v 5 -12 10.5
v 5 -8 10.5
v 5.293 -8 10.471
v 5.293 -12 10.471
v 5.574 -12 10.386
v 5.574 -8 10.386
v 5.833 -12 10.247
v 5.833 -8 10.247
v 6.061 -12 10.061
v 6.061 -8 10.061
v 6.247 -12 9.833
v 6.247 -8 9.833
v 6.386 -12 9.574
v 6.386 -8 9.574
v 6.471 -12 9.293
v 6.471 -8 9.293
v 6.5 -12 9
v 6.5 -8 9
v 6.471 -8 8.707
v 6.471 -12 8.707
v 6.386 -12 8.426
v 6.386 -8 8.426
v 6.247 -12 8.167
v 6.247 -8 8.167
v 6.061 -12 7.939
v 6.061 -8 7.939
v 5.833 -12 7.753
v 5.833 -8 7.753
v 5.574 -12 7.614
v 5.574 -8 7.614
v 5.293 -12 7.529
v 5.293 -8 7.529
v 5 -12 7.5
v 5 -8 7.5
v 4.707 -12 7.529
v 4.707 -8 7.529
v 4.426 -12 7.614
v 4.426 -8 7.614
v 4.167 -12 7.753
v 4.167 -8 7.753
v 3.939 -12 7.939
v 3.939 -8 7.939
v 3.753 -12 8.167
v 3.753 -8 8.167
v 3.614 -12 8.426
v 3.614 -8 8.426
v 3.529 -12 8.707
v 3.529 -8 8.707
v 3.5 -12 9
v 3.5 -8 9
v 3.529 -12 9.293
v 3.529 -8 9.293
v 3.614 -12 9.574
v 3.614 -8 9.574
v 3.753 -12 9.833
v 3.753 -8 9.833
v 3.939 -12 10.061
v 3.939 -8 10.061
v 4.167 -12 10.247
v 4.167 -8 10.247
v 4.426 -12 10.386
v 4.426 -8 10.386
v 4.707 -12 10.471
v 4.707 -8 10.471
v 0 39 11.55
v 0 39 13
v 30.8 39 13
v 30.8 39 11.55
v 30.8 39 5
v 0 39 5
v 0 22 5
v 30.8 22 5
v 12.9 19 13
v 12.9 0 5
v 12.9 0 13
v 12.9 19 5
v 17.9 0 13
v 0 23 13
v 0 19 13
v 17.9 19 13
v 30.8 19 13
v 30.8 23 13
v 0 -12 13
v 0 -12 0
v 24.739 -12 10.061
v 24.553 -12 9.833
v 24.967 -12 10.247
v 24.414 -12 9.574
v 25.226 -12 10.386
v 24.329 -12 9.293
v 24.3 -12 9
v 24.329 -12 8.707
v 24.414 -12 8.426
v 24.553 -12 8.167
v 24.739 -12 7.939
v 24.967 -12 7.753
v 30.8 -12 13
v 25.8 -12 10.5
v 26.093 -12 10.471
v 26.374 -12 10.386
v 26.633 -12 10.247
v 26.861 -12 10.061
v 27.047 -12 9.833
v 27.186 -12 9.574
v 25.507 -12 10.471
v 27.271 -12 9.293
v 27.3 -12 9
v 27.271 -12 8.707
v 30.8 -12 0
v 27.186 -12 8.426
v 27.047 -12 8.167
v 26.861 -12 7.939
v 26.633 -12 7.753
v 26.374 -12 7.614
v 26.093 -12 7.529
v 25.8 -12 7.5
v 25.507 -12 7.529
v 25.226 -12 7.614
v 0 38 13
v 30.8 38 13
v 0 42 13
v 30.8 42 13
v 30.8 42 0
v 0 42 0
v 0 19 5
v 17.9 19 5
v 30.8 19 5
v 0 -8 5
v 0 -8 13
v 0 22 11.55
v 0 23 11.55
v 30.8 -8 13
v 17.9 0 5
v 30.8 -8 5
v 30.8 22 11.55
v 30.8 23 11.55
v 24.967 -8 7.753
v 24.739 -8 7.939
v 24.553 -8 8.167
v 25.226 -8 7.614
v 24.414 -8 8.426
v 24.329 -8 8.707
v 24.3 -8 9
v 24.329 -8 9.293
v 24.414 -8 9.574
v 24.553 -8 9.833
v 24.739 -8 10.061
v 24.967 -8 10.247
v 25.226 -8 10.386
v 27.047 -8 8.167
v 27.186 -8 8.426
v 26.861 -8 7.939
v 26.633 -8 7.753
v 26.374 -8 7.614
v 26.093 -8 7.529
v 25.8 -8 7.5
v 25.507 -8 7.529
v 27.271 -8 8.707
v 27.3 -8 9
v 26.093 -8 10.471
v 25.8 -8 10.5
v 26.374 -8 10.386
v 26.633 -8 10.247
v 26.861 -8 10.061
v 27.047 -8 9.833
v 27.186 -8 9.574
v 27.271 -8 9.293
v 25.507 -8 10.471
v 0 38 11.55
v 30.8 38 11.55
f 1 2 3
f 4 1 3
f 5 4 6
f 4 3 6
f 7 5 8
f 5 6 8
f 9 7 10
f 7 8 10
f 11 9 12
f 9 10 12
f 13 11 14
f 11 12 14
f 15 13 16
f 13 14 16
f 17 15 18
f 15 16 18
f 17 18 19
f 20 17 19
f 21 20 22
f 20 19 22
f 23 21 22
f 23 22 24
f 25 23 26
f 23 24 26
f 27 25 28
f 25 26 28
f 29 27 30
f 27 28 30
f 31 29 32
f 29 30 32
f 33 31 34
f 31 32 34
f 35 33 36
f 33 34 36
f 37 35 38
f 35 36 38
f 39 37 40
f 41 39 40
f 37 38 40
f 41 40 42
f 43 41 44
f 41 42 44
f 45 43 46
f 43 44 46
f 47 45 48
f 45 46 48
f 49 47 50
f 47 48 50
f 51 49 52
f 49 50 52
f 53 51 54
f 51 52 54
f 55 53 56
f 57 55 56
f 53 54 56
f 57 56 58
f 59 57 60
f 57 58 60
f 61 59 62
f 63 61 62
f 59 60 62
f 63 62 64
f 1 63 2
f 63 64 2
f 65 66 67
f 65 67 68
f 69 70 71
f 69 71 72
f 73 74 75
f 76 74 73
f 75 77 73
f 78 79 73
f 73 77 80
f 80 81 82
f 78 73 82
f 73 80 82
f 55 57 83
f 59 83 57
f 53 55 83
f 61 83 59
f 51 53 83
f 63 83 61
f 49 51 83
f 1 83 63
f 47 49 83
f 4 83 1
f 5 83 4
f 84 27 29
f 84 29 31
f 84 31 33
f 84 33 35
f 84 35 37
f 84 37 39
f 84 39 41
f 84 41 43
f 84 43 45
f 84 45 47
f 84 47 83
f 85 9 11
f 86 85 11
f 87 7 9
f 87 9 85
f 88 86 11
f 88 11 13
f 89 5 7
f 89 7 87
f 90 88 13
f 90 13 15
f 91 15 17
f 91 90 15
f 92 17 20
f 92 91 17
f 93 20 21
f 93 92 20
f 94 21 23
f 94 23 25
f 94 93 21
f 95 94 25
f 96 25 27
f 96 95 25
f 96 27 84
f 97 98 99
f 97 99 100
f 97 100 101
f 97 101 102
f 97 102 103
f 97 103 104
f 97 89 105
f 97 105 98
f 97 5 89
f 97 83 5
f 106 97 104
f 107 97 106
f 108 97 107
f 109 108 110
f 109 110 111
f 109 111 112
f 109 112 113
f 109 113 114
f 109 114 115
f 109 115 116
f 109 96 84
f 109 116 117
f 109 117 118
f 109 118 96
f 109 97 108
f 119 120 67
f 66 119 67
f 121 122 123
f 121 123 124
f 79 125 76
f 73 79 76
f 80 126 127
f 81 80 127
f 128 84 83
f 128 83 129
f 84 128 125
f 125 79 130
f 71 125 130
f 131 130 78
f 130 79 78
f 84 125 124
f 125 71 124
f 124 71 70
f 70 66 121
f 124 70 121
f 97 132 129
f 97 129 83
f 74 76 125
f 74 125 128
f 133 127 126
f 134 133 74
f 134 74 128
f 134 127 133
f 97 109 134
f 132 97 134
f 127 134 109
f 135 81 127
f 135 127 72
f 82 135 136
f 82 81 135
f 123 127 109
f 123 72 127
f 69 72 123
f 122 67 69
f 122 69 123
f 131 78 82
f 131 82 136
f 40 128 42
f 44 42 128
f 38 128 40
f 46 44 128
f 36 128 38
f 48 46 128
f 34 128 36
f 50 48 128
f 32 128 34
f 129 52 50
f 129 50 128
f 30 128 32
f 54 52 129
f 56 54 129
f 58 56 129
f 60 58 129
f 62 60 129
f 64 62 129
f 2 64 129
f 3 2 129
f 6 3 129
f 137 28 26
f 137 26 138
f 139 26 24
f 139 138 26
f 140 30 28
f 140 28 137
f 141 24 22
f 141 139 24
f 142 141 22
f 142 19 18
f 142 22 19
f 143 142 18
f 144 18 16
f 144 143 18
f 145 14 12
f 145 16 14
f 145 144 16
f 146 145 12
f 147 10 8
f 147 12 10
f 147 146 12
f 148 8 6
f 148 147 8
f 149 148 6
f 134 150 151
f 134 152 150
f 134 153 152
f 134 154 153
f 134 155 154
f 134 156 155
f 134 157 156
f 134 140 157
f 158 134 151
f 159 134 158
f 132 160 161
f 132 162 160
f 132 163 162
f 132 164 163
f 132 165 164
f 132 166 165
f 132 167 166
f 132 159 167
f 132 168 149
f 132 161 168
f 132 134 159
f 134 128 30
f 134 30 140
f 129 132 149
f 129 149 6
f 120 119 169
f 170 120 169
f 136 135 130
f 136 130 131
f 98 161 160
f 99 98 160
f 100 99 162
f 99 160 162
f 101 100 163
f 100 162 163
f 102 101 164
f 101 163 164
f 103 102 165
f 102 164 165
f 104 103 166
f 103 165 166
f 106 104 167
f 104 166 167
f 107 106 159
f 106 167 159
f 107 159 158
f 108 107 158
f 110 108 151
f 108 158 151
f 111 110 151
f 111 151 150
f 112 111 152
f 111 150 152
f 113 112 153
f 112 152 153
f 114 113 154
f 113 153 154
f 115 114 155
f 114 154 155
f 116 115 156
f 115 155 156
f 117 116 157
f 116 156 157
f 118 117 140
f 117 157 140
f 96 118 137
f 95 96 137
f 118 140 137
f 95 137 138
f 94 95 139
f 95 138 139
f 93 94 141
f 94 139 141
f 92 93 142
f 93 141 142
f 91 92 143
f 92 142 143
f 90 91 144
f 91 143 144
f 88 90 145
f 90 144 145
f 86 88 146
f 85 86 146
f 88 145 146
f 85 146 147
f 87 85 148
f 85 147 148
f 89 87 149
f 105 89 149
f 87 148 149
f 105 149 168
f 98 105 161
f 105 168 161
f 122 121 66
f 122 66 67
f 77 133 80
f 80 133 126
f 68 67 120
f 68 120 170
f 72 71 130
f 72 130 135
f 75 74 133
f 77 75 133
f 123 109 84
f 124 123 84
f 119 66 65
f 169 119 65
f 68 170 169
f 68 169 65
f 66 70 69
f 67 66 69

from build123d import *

# Parameters (mm, degrees)
SKETCH_1_W          = 30.8
SKETCH_1_H          = 39
EXTRUDE_1_DEPTH     = 5
SKETCH_2_W          = 30.8
SKETCH_2_H          = 3
EXTRUDE_2_DEPTH     = 8
SKETCH_3_W          = 5
SKETCH_3_H          = 19
EXTRUDE_3_DEPTH     = 8
EXTRUDE_4_DEPTH     = 30.8
SKETCH_5_R          = 1.5
CUT_EXTRUDE_1_DEPTH = 4
SKETCH_6_W          = 1.45
SKETCH_6_H          = 1
EXTRUDE_5_DEPTH     = 30.8
SKETCH_7_W          = 30.8
SKETCH_7_H          = 3
EXTRUDE_6_DEPTH     = 5


with BuildPart() as part:
    # 草图1 → 凸台-拉伸1 (new body)
    with BuildSketch(Plane.XY):
        with Locations((15.4, 19.5)):
            Rectangle(SKETCH_1_W, SKETCH_1_H)
    extrude(amount=EXTRUDE_1_DEPTH)

    # 草图2 → 凸台-拉伸2 (add)
    with BuildSketch(Plane.XY.offset(5)):
        with Locations((15.4, 40.5)):
            Rectangle(SKETCH_2_W, SKETCH_2_H)
        with Locations((15.4, 20.5)):
            Rectangle(SKETCH_2_W, SKETCH_2_H)
    extrude(amount=EXTRUDE_2_DEPTH)


with BuildPart() as extrude_2_piece_1:
    # of the separate pieces the step leaves, piece 1, a body of its own (extrude_2_pieces)
    add(part.part.solids().sort_by_distance((0, 0, 0))[0])

    # 草图3 → 凸台-拉伸3 (add)
    with BuildSketch(Plane.XY.offset(5)):
        with Locations((15.4, 9.5)):
            Rectangle(SKETCH_3_W, SKETCH_3_H)
    extrude(amount=EXTRUDE_3_DEPTH)

    # 草图4 → 凸台-拉伸4 (add)
    with BuildSketch(Plane(origin=(30.8, 0, 0), x_dir=(0, 0, -1), z_dir=(1, 0, 0))):
        Polygon((-5, 0), (-5, -8), (-13, -8), (-13, -12), (0, -12), (0, 0), align=None)
    extrude(amount=-EXTRUDE_4_DEPTH)

    # 草图5 → 切除-拉伸1 (cut)
    with BuildSketch(Plane(origin=(0, -8, 0), x_dir=(1, 0, 0), z_dir=(0, 1, 0))):
        with Locations(Location((5, -9, 0), (0, 0, 270))):
            Circle(SKETCH_5_R)
        with Locations(Location((25.8, -9, 0), (0, 0, 270))):
            Circle(SKETCH_5_R)
    extrude(amount=-CUT_EXTRUDE_1_DEPTH, mode=Mode.SUBTRACT)

    # 草图6 → 凸台-拉伸5 (add, through all)
    with BuildSketch(Plane(origin=(30.8, 0, 0), x_dir=(0, 0, -1), z_dir=(1, 0, 0))):
        with Locations((-12.275, 38.5)):
            Rectangle(SKETCH_6_W, SKETCH_6_H)
        with Locations((-12.275, 22.5)):
            Rectangle(SKETCH_6_W, SKETCH_6_H)
    extrude(amount=-EXTRUDE_5_DEPTH)


with BuildPart() as extrude_2_piece_2:
    # of the separate pieces the step leaves, piece 2, a body of its own (extrude_2_pieces)
    add(part.part.solids().sort_by_distance((30.8, 39, 13))[0])



with BuildPart() as extrude_5_piece_1:
    # of the separate pieces the step leaves, piece 1, a body of its own (extrude_5_pieces)
    add(extrude_2_piece_1.part.solids().sort_by_distance((17.9, 0, 5))[0])


with BuildPart() as extrude_5_piece_2:
    # of the separate pieces the step leaves, piece 2, a body of its own (extrude_5_pieces)
    add(extrude_2_piece_1.part.solids().sort_by_distance((30.8, 39, 13))[0])


with BuildPart() as extrude_2_piece_2_1:
    add(extrude_2_piece_2.part)

    add(extrude_5_piece_1.part)  # 凸台-拉伸6 merges 凸台-拉伸5 piece 1
    # 草图7 → 凸台-拉伸6 (add)
    with BuildSketch(Plane(origin=(0, 0, 5), x_dir=(-1, 0, 0), z_dir=(0, 0, -1))):
        with Locations((-15.4, 40.5)):
            Rectangle(SKETCH_7_W, SKETCH_7_H)
    extrude(amount=EXTRUDE_6_DEPTH)


solid = Compound([extrude_5_piece_2.part, extrude_2_piece_2_1.part])
